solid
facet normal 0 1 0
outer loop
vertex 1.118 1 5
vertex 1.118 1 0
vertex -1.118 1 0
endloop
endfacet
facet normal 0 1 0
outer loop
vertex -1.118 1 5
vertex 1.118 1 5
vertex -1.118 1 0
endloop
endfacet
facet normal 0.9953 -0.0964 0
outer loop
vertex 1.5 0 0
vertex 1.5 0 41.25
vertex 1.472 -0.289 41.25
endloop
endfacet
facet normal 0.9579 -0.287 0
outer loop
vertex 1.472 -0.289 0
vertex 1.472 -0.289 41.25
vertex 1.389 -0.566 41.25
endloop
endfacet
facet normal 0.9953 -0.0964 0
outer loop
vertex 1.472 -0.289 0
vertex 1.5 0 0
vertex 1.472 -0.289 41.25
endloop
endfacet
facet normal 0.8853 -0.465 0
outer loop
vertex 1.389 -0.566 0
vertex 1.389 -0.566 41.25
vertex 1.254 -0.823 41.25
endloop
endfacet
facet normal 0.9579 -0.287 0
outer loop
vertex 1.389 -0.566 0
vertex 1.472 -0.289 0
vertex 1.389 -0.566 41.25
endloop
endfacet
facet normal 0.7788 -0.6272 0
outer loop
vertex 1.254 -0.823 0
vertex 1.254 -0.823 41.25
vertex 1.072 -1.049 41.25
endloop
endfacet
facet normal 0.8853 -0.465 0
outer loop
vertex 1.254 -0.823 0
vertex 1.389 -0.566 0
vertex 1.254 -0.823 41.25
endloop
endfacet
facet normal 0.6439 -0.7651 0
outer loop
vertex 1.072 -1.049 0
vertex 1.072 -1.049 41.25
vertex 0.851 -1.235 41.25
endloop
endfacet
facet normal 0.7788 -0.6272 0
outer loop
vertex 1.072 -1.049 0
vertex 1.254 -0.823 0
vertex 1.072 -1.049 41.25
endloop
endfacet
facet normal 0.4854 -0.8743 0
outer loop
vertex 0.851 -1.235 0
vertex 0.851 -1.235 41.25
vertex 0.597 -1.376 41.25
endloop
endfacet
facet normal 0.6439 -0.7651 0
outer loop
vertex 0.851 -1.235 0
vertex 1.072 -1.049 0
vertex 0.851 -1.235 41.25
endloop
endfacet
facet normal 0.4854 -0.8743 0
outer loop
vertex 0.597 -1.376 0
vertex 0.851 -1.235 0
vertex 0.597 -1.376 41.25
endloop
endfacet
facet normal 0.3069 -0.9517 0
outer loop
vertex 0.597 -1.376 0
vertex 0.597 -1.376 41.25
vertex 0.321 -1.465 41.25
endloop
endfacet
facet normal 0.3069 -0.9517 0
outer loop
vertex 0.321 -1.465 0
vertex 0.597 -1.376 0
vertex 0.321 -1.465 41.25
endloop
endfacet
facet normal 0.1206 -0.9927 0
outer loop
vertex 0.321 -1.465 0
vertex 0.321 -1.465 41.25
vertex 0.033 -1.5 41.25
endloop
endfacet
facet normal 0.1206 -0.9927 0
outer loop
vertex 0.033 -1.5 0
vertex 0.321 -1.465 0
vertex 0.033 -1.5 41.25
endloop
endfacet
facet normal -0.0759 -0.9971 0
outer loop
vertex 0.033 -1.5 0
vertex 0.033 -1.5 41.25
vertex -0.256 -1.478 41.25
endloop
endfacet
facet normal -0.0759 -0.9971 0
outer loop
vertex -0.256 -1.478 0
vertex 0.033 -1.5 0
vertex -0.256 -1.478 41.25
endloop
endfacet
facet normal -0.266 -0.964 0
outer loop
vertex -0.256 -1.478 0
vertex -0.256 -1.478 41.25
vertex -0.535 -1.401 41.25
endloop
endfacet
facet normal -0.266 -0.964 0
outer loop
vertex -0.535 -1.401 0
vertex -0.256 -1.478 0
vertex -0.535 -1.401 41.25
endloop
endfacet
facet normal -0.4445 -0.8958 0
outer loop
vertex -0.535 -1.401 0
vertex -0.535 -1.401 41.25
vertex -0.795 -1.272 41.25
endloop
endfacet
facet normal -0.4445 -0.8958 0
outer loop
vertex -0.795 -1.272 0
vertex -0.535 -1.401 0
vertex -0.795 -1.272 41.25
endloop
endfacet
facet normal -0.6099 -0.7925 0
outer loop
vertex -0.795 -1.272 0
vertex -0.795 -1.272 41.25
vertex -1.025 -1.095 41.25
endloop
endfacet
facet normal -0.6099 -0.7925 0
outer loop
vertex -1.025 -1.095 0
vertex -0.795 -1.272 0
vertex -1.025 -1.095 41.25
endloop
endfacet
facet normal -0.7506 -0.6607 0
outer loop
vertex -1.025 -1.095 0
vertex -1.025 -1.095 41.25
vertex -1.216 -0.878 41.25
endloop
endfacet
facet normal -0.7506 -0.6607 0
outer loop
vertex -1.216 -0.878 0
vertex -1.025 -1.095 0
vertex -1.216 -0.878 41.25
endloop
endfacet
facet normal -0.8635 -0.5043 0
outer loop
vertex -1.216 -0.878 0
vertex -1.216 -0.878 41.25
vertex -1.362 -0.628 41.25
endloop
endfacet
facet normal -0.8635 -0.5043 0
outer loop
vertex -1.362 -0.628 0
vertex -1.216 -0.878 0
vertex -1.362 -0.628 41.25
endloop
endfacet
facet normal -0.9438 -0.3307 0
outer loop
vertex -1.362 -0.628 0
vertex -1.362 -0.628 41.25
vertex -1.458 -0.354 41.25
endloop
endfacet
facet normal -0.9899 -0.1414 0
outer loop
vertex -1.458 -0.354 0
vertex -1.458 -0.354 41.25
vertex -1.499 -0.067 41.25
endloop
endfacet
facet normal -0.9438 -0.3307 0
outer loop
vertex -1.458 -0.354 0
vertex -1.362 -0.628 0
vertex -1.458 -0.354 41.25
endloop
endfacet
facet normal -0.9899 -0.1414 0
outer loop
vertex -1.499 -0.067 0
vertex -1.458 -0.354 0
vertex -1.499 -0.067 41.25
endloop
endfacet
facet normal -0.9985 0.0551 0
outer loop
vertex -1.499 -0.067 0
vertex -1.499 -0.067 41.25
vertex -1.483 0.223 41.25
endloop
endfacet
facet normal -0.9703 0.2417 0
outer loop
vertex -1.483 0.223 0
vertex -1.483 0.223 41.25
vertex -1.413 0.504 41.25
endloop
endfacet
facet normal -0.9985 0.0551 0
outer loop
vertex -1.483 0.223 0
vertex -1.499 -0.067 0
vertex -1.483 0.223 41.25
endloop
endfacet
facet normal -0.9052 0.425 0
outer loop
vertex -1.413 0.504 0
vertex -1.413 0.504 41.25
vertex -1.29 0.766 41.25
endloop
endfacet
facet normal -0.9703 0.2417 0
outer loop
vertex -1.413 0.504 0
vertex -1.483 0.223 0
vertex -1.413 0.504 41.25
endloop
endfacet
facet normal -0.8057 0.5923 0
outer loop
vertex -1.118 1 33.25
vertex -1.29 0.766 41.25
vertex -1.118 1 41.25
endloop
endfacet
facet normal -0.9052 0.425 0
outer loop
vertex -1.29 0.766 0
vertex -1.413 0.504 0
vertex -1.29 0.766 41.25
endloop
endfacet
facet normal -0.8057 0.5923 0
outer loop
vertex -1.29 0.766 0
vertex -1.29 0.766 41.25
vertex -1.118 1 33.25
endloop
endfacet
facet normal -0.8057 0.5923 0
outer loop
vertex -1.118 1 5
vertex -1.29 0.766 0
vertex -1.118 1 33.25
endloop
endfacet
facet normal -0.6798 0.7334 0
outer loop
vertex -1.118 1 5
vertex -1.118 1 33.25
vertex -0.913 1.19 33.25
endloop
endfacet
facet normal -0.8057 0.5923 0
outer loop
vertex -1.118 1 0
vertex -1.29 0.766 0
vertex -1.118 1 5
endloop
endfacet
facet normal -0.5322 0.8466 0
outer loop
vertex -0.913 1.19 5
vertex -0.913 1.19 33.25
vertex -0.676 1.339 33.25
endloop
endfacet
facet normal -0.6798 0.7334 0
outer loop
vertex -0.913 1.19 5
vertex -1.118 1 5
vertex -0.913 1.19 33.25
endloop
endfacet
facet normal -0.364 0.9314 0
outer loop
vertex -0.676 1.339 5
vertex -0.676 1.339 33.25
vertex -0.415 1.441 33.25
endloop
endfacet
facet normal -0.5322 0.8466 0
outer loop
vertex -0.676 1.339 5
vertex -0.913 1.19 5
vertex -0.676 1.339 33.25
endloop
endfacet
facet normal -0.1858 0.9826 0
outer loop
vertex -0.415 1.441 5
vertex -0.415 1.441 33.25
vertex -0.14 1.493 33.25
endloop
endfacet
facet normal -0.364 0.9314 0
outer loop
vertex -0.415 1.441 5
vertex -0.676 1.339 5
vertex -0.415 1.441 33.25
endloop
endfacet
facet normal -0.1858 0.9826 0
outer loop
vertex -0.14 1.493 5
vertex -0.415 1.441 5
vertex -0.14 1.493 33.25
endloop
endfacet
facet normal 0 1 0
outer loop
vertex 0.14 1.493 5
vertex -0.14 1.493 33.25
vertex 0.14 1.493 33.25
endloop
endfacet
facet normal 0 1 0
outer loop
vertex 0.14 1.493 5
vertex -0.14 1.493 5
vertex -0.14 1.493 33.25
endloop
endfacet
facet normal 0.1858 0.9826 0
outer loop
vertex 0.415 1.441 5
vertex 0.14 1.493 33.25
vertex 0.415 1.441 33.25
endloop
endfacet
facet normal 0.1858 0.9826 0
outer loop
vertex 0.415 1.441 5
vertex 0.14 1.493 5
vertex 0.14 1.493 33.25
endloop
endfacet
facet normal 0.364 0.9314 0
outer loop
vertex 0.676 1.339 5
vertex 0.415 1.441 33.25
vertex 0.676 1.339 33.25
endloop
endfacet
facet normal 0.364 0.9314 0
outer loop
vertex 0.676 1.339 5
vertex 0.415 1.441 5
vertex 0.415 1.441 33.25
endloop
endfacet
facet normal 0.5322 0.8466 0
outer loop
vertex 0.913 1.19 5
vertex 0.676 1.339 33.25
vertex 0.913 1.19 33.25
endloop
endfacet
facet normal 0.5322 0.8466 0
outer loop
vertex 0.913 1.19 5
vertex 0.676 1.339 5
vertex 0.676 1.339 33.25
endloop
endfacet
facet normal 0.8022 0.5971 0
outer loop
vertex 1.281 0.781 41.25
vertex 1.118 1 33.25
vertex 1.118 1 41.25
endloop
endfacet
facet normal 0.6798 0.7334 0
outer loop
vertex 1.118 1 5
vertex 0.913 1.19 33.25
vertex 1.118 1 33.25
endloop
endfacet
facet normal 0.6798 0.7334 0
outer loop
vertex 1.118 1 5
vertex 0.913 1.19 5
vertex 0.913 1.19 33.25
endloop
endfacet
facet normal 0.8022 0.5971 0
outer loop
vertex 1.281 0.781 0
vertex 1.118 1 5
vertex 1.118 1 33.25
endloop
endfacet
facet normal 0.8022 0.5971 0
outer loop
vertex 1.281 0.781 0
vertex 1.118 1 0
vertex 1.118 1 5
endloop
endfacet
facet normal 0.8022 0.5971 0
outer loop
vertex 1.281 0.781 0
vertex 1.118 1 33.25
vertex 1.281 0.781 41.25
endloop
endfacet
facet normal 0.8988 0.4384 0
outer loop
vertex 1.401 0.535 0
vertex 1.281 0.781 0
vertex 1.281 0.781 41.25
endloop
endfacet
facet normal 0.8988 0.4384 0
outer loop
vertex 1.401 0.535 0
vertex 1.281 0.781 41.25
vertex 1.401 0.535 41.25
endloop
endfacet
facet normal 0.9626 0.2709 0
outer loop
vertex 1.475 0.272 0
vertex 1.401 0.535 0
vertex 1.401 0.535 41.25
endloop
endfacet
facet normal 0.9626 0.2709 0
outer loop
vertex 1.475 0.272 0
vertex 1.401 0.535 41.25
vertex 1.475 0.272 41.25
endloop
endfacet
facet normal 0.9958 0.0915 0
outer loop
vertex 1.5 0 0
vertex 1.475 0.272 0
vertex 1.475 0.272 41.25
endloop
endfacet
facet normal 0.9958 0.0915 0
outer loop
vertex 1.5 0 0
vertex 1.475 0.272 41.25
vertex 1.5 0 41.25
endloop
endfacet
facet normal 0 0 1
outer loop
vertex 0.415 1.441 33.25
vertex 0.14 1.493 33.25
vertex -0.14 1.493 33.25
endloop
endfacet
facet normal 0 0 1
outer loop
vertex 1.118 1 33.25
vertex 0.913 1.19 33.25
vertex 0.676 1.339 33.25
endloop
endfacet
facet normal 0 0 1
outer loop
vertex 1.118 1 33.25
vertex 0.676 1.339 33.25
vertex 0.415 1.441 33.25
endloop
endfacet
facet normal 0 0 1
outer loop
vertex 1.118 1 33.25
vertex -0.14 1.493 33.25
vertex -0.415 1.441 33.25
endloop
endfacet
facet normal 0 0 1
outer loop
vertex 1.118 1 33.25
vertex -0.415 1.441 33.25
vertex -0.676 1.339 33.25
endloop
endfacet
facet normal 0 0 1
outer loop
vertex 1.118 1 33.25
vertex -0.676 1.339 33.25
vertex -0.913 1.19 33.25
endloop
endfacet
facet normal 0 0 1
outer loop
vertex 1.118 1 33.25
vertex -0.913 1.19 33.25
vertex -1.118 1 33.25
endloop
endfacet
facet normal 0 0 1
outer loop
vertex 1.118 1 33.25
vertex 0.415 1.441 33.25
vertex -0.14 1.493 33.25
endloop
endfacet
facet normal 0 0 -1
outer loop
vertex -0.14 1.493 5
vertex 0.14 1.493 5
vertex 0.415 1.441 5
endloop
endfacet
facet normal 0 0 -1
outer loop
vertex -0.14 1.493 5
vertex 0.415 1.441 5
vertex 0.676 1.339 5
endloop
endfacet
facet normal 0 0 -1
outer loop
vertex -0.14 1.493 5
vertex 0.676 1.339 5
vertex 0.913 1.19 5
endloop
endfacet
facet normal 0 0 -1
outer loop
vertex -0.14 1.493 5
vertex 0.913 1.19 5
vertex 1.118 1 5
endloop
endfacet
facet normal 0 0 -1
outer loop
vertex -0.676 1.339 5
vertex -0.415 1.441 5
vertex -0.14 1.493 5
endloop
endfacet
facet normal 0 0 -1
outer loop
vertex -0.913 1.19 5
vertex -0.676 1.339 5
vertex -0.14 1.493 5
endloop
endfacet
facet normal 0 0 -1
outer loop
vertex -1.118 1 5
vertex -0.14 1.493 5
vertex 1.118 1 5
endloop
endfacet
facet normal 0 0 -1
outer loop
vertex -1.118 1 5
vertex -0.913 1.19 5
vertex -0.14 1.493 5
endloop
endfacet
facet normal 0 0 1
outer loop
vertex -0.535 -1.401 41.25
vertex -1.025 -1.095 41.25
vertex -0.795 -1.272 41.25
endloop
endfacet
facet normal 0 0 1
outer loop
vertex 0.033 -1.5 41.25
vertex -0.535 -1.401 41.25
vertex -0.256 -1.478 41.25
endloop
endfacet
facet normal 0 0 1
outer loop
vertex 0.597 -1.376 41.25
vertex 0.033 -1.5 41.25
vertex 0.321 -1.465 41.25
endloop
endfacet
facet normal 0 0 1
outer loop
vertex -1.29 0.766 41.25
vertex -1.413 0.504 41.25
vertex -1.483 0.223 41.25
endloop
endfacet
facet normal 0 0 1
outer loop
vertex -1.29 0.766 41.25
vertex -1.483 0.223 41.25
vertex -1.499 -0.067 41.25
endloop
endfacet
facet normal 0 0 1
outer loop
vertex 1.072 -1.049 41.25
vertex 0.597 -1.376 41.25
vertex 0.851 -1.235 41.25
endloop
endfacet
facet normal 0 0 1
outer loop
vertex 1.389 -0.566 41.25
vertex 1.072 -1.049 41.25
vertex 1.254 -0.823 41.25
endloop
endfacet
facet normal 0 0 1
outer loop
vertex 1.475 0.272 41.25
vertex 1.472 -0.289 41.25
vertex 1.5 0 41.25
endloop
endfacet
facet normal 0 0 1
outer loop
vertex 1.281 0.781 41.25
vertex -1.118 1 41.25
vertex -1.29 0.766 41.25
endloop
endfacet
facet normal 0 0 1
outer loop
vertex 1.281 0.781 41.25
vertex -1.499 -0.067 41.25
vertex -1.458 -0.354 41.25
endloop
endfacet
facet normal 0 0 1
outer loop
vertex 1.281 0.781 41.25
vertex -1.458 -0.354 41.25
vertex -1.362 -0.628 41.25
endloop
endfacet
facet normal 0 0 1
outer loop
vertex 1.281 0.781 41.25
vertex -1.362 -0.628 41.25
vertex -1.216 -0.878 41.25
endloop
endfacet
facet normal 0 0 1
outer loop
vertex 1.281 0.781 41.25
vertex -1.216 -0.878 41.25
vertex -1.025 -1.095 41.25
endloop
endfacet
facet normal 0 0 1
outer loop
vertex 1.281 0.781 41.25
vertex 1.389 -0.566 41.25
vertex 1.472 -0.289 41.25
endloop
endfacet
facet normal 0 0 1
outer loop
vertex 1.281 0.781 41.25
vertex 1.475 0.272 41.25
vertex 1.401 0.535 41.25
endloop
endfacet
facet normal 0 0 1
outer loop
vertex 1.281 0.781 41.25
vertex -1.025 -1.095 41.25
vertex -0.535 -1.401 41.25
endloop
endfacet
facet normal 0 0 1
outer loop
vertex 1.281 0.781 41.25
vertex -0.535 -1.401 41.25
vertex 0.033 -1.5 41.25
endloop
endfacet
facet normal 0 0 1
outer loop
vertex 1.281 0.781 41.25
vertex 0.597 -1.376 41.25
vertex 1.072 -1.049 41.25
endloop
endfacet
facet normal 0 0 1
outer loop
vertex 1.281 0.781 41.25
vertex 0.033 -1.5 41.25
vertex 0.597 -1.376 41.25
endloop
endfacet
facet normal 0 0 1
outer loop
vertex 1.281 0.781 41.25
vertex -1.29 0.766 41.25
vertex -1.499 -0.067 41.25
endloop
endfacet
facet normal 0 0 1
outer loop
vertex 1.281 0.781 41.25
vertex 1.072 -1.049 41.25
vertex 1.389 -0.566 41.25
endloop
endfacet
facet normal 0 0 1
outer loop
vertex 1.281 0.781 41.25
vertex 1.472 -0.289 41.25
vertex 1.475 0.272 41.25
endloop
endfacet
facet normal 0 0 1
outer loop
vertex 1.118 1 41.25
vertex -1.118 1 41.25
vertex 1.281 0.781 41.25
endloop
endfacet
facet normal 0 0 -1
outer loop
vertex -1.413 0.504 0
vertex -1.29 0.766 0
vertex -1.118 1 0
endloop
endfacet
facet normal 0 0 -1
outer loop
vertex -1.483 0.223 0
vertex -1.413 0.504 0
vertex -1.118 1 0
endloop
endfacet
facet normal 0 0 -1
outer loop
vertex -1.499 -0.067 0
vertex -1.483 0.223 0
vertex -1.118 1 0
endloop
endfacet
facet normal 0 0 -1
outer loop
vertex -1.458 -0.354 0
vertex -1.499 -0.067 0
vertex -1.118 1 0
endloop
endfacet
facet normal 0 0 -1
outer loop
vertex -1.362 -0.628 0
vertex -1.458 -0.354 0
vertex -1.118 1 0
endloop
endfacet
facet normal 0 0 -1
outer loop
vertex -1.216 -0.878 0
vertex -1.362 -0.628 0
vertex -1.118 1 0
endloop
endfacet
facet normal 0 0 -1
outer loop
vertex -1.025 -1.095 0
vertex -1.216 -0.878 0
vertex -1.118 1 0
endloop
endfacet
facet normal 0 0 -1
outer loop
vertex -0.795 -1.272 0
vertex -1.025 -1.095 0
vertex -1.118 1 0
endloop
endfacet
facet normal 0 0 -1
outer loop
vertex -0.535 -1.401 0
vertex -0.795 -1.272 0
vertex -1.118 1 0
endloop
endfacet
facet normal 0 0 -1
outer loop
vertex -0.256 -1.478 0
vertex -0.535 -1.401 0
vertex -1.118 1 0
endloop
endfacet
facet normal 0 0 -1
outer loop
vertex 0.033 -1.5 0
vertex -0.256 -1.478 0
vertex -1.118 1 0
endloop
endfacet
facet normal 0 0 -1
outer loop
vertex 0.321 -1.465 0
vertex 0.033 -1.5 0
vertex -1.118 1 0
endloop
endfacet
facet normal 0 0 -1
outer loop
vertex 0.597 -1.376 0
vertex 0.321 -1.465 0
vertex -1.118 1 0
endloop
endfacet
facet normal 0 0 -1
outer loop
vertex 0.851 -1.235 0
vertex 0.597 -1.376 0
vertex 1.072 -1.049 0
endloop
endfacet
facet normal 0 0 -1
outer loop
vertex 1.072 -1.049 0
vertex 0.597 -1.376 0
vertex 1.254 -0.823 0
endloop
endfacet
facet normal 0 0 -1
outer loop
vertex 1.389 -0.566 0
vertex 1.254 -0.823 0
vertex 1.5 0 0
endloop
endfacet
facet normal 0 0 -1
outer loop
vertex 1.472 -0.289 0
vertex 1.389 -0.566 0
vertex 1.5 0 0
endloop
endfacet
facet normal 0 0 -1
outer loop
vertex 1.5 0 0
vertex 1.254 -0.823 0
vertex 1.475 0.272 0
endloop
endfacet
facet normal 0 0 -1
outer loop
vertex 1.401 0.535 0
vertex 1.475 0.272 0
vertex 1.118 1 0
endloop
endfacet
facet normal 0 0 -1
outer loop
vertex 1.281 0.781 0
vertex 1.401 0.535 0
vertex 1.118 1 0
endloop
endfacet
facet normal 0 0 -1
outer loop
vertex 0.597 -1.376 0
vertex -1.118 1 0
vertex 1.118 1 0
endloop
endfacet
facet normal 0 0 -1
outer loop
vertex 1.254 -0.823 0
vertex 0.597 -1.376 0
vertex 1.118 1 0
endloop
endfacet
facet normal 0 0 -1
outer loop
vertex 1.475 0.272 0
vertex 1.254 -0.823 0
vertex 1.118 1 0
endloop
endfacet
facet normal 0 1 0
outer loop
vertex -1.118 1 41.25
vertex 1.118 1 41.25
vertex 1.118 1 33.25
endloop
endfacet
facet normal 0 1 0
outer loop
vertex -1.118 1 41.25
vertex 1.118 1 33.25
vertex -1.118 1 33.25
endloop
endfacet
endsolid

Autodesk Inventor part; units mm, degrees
ref_plane "YZ Plane" through (0, 0, 0) normal (1, 0, 0) x (0, 1, 0)
ref_plane "XZ Plane" through (0, 0, 0) normal (0, 1, 0) x (-1, 0, 0)
ref_plane "XY Plane" through (0, 0, 0) normal (0, 0, 1) x (1, 0, 0)
sketch "Эскиз1" plane through (0, 0, 0) normal (0, 0, 1) x (1, 0, 0)
  circle A0 centre (0, 0) radius 1.5
  dimension "d0" = 3
extrude "Выдавливание1" add sketch "Эскиз1" along normal blind 41.25
sketch "Эскиз2" plane through (0, 0, 41.25) normal (0, 0, 1) x (1, 0, 0)
  line L0 (-1.5, -1) -> (1.5, -1)
  line L1 (1.5, -1) -> (1.5, 1)
  line L2 (1.5, 1) -> (-1.5, 1)
  line L3 (-1.5, 1) -> (-1.5, -1)
  line L4 (-1.5, -1) -> (1.5, 1) construction
  line L5 (1.5, -1) -> (-1.5, 1) construction
  circle A0 centre (0, 0) radius 1.5
  point P0 (-1.118, 1)
  point P1 (1.118, 1)
  dimension "d3" = 2
extrude "Выдавливание2" cut sketch "Эскиз2" against normal blind 8 contours A0 L2
sketch "Эскиз3" plane through (0, 0, 0) normal (0, 0, -1) x (-1, 0, 0)
  arc A0 (1.118, 1) -> (-1.118, 1) centre (0, 0) ccw projected
  line L0 (-1.118, 1) -> (1.118, 1) projected
extrude "Выдавливание3" cut sketch "Эскиз3" against normal blind 5
equation "\"Радиус_гибки\" = Толщина"
equation "\"Ширина_просечки\" = Толщина"
equation "\"Глубина_просечки\" = 0.5 * Толщина"
equation "\"Размер_просечки\" = 4 * Толщина"
equation "\"Мин_остаток\" = 2 * Толщина"
equation "\"Радиус_перехода\" = Радиус_гибки"
equation "\"Радиус_Якоби\" = Толщина"
equation "\"Размер_зазора\" = Толщина"
equation "\"Толщина\" = 0.5"
properties part number "Ось 3мм задняя"
